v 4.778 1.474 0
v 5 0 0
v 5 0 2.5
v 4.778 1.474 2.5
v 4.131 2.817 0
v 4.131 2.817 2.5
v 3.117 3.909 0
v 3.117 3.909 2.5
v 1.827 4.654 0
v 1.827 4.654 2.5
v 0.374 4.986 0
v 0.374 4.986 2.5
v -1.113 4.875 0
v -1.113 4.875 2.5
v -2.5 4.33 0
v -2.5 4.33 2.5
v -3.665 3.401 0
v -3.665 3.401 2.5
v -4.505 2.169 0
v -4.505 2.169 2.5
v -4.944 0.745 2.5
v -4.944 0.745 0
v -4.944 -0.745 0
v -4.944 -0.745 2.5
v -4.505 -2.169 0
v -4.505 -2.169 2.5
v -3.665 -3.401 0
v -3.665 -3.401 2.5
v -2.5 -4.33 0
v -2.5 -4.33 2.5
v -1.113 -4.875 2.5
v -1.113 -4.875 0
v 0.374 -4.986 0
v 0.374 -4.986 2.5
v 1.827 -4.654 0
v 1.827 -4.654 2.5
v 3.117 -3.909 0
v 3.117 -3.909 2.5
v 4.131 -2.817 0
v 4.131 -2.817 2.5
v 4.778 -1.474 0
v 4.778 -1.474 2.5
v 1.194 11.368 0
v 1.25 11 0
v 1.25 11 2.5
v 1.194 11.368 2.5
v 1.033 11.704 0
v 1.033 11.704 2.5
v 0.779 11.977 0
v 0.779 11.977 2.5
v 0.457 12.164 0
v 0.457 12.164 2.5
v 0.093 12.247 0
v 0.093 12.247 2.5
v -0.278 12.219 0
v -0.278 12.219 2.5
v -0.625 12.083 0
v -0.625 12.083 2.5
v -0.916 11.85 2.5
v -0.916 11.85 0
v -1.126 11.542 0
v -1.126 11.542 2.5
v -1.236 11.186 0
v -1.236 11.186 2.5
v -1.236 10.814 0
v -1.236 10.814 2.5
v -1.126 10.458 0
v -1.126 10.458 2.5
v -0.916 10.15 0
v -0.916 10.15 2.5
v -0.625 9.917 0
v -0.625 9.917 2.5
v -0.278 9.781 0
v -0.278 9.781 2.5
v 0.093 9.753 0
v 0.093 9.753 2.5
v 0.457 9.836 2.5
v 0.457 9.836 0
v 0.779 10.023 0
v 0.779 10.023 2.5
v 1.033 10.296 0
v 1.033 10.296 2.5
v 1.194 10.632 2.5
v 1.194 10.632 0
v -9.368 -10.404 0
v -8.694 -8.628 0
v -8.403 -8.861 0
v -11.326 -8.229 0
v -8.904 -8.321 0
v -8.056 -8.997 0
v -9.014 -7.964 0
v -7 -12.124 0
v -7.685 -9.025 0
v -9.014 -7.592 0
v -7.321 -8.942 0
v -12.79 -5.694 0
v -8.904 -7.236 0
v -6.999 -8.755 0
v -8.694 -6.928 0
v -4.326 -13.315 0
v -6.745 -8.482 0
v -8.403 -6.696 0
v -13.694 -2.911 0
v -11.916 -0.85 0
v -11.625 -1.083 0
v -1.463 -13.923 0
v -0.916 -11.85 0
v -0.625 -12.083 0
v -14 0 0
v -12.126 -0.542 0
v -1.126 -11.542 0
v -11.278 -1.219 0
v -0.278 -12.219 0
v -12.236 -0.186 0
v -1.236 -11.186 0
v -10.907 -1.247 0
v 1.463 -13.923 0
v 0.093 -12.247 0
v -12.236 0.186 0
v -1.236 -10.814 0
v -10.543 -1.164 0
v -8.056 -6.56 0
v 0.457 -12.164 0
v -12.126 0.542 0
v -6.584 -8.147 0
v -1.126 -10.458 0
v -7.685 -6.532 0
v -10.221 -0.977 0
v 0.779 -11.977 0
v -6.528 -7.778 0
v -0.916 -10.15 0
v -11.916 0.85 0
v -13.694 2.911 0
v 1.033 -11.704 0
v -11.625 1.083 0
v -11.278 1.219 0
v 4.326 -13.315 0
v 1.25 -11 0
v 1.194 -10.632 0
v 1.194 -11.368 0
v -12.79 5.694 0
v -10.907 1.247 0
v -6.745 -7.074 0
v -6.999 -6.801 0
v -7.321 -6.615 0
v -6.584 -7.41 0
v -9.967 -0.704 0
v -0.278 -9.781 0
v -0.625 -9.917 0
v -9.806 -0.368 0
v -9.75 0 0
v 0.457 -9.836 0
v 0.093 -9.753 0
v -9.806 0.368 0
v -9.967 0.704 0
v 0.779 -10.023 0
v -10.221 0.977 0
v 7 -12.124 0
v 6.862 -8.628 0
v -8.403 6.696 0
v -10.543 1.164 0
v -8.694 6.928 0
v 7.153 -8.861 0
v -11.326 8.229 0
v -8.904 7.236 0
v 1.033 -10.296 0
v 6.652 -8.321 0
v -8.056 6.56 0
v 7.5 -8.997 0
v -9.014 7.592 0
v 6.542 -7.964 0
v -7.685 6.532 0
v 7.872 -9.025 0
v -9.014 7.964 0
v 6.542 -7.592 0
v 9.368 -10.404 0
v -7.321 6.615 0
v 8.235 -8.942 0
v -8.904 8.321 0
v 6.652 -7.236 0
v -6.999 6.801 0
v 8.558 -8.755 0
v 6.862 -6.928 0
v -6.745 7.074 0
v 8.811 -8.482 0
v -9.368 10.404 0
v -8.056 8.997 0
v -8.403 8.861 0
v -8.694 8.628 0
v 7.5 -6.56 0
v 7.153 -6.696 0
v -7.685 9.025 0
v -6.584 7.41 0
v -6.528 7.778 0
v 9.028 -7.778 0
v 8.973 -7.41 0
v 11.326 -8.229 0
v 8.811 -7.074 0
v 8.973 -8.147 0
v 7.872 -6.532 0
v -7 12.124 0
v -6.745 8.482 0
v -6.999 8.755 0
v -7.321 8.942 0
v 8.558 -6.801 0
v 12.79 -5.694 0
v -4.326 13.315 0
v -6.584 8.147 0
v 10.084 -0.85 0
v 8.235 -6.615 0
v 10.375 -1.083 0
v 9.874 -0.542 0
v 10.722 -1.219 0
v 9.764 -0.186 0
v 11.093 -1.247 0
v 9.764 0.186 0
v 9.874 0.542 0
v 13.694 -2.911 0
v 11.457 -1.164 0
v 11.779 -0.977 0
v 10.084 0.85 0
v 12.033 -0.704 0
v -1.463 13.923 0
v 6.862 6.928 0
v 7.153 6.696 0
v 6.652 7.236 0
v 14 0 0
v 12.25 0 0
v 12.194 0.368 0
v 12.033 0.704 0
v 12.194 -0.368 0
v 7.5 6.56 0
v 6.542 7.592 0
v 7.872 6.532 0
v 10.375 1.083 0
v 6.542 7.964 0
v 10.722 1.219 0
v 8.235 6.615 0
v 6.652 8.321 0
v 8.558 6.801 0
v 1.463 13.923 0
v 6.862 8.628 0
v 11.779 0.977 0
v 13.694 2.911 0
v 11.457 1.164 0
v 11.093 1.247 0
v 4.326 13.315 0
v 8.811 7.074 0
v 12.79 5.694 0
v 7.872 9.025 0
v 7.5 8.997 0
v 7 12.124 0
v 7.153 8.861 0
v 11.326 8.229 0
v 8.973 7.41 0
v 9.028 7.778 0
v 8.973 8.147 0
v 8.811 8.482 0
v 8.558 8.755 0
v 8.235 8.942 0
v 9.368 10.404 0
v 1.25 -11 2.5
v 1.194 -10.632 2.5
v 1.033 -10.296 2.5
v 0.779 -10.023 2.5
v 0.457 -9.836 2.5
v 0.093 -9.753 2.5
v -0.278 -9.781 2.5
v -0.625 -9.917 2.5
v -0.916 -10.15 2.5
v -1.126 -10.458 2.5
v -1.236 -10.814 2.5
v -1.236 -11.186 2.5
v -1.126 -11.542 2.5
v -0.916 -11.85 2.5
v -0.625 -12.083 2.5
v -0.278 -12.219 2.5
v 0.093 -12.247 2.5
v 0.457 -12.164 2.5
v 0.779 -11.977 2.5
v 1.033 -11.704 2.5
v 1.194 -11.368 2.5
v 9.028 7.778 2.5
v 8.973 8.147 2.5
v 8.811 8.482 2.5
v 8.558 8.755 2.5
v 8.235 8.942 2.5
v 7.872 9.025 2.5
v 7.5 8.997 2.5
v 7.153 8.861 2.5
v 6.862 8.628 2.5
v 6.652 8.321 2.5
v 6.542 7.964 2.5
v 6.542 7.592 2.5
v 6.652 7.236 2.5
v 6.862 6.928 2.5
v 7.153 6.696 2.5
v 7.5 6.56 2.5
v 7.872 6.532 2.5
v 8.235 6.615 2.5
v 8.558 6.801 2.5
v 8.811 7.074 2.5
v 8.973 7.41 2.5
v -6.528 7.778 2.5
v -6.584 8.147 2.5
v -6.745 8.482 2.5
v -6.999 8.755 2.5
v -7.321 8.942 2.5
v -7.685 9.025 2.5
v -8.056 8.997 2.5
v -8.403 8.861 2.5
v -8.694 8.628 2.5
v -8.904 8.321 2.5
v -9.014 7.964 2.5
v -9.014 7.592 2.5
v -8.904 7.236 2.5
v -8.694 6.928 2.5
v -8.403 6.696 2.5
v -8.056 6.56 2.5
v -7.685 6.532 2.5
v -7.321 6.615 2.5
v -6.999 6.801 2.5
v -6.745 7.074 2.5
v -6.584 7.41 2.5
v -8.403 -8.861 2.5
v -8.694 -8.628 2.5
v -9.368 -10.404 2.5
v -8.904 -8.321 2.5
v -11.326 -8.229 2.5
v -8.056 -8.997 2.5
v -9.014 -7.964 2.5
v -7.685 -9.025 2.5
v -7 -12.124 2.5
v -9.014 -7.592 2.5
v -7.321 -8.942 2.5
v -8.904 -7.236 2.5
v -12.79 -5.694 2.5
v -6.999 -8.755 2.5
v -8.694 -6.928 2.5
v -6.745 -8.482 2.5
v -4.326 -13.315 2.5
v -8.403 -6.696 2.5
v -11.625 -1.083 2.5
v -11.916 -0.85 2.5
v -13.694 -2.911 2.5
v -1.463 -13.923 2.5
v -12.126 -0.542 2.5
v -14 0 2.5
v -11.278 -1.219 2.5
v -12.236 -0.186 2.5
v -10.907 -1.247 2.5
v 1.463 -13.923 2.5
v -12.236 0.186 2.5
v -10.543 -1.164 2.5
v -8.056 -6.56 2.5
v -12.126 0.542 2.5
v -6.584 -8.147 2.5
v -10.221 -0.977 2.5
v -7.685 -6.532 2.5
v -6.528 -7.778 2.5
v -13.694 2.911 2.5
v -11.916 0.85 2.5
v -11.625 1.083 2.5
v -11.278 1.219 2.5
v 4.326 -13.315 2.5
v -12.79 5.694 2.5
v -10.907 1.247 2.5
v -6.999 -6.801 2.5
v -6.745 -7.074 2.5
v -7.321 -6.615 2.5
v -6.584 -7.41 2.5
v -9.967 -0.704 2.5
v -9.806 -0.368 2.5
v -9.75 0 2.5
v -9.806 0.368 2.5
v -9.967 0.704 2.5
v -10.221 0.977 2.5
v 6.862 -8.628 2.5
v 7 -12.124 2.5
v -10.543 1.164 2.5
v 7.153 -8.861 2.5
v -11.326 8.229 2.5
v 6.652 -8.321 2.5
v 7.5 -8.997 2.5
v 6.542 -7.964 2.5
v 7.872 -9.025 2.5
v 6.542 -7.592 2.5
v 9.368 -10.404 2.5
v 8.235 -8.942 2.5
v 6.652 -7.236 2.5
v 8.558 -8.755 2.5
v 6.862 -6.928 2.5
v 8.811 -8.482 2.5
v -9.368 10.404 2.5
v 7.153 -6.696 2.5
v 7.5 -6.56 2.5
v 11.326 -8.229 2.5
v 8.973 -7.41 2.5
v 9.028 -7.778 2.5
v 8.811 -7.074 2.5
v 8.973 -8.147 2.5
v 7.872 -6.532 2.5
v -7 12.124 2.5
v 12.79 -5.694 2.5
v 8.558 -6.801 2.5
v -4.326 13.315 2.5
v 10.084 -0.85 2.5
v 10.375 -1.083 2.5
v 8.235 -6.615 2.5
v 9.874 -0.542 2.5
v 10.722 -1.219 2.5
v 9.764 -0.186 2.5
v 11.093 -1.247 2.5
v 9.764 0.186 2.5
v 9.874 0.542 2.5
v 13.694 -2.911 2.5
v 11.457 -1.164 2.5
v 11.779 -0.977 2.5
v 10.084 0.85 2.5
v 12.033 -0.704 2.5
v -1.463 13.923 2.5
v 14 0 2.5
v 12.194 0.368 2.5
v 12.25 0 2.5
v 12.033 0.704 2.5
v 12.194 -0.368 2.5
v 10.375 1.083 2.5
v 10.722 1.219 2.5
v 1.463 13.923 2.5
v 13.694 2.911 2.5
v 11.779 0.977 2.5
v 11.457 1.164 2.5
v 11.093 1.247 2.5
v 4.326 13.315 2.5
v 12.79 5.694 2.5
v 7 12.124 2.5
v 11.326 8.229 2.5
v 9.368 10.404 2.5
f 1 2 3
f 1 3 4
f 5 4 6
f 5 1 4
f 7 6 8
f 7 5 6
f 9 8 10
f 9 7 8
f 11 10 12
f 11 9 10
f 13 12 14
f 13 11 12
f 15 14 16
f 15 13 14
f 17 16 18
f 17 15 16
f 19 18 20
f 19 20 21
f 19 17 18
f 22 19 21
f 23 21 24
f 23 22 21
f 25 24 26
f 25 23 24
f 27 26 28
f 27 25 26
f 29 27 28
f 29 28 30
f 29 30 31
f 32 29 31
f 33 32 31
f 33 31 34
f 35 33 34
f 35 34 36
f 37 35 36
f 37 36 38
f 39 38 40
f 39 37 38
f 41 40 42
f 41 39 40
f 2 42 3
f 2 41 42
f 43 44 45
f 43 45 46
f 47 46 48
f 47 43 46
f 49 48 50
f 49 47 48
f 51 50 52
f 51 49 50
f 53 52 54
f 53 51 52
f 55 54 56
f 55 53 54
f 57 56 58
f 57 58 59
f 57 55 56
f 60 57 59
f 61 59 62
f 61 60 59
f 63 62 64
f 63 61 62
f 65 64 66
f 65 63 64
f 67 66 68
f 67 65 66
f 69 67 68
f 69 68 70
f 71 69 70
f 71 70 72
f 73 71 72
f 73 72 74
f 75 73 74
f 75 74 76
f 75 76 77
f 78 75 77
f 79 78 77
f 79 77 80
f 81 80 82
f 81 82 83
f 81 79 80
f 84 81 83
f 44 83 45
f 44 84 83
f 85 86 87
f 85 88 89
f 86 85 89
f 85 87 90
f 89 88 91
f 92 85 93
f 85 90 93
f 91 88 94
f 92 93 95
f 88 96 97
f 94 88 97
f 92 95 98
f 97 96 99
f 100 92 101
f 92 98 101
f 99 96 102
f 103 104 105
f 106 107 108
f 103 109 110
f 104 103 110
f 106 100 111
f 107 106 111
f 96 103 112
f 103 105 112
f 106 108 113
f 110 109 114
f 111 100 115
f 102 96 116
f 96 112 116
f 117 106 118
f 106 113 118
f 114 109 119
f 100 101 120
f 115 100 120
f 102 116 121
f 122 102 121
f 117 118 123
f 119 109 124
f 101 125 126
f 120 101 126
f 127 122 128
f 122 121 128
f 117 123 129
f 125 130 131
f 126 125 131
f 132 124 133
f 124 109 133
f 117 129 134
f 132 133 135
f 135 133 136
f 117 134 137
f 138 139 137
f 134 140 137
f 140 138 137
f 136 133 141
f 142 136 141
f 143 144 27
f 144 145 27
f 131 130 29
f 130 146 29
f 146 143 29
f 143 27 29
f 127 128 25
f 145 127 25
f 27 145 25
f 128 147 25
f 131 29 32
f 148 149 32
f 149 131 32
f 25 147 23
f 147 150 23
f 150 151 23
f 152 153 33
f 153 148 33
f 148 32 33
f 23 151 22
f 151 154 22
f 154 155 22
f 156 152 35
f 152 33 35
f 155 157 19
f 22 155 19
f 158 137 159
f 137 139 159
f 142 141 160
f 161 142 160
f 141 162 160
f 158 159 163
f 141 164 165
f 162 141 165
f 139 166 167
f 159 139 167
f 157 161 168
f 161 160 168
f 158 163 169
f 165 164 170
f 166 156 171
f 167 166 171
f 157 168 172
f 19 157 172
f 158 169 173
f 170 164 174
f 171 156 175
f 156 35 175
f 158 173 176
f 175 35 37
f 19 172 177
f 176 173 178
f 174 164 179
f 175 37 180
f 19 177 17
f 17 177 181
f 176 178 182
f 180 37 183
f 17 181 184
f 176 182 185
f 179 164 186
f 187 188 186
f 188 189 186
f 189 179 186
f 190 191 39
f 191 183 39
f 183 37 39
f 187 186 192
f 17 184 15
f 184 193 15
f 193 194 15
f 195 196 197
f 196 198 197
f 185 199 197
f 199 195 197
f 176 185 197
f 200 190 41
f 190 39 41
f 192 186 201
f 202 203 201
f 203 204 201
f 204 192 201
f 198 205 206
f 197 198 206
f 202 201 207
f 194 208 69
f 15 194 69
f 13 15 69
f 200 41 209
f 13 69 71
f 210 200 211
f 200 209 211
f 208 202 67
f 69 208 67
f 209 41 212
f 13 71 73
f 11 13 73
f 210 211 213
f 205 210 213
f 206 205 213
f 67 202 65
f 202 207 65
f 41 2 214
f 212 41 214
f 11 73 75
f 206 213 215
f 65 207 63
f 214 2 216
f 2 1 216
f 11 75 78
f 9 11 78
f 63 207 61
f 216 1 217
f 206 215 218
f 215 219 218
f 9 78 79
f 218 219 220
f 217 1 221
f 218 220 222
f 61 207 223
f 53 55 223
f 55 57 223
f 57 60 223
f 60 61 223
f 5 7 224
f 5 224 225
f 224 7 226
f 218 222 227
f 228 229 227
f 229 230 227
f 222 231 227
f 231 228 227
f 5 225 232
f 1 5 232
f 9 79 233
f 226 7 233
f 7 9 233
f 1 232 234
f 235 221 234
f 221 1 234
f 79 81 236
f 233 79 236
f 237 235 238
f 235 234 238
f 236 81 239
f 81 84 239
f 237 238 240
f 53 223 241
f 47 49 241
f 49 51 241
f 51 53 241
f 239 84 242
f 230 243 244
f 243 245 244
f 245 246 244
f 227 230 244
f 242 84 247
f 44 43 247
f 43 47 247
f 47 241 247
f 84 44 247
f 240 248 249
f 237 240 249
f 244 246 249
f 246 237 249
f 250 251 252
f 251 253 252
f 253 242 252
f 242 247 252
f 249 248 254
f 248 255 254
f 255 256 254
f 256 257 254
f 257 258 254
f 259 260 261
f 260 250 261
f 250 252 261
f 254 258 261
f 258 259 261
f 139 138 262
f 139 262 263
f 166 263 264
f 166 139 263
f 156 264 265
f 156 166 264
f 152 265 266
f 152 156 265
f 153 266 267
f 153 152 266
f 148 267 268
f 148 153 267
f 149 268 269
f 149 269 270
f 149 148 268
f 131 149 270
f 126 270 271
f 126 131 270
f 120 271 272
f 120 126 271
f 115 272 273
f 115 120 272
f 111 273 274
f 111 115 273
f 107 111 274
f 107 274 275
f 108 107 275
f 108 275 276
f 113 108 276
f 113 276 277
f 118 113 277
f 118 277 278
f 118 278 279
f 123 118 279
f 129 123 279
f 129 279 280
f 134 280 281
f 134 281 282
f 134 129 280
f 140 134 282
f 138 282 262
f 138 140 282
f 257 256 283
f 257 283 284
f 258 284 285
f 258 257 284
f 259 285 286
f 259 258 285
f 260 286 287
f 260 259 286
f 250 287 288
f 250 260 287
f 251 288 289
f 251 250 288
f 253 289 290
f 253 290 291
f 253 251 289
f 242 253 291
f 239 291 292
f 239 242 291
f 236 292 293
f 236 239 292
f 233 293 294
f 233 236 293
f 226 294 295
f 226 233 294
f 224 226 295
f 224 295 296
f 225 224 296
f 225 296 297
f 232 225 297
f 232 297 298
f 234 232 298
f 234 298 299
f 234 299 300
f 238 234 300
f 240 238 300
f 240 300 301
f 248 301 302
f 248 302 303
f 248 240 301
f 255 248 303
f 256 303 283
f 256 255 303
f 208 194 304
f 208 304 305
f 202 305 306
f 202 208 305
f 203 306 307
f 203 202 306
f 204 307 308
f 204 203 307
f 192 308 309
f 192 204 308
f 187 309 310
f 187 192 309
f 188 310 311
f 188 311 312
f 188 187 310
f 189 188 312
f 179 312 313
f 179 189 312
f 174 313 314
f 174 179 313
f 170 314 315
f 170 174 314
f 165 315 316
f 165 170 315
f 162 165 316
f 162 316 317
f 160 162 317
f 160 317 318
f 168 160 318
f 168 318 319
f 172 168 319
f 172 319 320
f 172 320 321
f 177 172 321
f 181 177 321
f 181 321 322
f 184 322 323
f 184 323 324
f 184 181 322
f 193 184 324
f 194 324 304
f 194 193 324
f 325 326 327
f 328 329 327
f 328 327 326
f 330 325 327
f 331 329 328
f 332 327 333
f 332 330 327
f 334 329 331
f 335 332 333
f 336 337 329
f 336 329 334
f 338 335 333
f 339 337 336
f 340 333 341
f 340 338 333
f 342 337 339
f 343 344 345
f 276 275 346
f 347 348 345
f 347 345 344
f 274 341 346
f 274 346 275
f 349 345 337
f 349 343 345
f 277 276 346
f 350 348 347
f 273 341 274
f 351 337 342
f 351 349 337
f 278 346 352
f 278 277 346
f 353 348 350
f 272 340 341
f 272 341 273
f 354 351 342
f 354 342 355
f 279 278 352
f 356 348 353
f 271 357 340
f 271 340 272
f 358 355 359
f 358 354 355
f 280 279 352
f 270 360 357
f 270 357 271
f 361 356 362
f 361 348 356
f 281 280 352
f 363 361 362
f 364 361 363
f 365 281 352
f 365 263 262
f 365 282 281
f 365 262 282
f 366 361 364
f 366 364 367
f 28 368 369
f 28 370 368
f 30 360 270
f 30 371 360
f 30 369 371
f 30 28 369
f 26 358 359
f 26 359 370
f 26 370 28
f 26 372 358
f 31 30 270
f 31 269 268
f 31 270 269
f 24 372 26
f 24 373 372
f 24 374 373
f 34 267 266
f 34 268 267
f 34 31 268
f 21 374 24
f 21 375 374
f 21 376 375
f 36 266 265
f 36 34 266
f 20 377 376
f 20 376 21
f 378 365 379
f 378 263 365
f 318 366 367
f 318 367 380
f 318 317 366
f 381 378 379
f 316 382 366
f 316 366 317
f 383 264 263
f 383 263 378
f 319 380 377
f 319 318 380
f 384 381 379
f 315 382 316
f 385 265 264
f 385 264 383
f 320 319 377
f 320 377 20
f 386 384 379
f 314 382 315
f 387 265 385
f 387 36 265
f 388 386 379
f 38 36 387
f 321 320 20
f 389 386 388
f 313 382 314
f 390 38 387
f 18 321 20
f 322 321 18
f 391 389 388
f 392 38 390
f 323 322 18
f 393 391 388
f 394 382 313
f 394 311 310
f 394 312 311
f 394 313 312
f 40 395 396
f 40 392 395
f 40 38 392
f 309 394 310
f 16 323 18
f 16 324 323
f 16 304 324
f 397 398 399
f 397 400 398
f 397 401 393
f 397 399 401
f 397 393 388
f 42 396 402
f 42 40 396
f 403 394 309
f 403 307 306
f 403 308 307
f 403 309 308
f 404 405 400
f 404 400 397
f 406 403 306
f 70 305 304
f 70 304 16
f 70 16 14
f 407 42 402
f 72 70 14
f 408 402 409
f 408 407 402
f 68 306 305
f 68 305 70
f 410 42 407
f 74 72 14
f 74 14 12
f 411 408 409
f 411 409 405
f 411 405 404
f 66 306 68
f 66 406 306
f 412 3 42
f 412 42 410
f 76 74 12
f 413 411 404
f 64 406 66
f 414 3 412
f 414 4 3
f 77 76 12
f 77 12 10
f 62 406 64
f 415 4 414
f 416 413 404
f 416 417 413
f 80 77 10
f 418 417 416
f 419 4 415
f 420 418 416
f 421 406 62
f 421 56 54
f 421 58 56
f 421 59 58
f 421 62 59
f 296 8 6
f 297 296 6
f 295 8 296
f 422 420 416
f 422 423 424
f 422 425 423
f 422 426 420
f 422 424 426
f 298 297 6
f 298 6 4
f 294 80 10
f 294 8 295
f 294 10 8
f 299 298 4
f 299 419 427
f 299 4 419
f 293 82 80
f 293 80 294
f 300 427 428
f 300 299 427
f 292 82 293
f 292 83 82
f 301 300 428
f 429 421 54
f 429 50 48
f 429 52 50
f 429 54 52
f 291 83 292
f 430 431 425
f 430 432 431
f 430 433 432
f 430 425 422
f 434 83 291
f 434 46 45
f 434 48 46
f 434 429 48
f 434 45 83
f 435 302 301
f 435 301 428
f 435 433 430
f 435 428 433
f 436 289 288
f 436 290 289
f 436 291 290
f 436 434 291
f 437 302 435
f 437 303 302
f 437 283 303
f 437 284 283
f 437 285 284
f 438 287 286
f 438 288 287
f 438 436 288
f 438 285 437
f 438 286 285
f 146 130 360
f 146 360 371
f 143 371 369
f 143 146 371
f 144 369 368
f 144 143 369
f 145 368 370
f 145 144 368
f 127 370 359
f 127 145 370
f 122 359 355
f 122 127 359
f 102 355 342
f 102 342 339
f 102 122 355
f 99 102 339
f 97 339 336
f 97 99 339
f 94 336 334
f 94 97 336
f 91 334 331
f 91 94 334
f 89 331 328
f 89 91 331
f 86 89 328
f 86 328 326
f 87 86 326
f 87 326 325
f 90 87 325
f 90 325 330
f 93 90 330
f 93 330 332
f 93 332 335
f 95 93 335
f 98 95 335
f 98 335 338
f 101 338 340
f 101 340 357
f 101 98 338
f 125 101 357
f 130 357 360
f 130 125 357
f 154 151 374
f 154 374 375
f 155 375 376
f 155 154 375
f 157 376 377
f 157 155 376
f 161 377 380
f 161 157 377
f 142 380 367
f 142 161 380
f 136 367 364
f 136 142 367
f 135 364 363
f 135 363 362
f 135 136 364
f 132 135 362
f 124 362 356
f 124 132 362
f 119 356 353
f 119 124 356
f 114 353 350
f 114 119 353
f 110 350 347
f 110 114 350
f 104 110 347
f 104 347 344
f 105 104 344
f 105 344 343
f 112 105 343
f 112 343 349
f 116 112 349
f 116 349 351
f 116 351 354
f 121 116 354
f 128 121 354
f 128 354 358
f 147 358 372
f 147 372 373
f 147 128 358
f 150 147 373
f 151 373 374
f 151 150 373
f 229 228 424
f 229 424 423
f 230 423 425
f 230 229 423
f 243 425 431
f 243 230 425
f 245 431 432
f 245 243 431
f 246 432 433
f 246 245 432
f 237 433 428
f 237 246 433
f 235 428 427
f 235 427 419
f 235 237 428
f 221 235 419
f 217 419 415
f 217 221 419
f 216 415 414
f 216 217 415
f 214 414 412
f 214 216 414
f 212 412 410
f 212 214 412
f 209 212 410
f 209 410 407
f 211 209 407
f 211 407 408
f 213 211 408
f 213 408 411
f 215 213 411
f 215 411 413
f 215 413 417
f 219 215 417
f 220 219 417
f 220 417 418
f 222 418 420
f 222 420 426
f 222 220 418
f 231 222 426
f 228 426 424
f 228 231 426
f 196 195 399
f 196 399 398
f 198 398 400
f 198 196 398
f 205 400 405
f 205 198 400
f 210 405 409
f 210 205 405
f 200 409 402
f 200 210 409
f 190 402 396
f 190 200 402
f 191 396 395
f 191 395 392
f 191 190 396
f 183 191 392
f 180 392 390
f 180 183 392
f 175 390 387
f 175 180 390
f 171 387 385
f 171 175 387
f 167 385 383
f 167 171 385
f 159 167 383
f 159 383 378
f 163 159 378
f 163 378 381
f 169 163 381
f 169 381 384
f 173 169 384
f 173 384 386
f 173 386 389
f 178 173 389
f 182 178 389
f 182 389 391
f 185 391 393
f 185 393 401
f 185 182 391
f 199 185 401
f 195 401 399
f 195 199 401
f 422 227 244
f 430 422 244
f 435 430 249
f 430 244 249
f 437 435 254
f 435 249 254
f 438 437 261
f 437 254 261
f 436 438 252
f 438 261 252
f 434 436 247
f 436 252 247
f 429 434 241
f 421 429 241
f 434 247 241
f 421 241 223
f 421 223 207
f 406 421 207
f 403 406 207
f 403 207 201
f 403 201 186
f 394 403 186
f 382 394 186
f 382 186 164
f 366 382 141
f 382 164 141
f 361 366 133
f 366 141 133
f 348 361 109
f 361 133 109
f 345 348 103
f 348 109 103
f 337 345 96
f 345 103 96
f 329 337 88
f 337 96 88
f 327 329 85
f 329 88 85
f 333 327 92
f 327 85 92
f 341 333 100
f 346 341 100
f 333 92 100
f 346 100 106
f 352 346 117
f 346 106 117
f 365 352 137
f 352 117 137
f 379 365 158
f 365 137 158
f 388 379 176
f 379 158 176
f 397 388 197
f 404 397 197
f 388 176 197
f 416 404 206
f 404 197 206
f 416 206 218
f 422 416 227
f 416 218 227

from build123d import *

# Parameters (mm, degrees)
ESBO_O1_R                = 14
ESBO_O1_R_2              = 5
ESBO_O1_R_3              = 1.25
RESSALTO_EXTRUS_O1_DEPTH = 2.5


with BuildPart() as part:
    # Esboço1 → Ressalto-extrusão1 (new body)
    with BuildSketch(Plane.XY):
        Circle(ESBO_O1_R)
        Circle(ESBO_O1_R_2, mode=Mode.SUBTRACT)
        with Locations((0, 11)):
            Circle(ESBO_O1_R_3, mode=Mode.SUBTRACT)
        with Locations((7.778174593, 7.778174593)):
            Circle(ESBO_O1_R_3, mode=Mode.SUBTRACT)
        with Locations((11, 0)):
            Circle(ESBO_O1_R_3, mode=Mode.SUBTRACT)
        with Locations((7.778174593, -7.778174593)):
            Circle(ESBO_O1_R_3, mode=Mode.SUBTRACT)
        with Locations((0, -11)):
            Circle(ESBO_O1_R_3, mode=Mode.SUBTRACT)
        with Locations((-7.778174593, -7.778174593)):
            Circle(ESBO_O1_R_3, mode=Mode.SUBTRACT)
        with Locations((-11, 0)):
            Circle(ESBO_O1_R_3, mode=Mode.SUBTRACT)
        with Locations((-7.778174593, 7.778174593)):
            Circle(ESBO_O1_R_3, mode=Mode.SUBTRACT)
    extrude(amount=RESSALTO_EXTRUS_O1_DEPTH)


solid = part.part
